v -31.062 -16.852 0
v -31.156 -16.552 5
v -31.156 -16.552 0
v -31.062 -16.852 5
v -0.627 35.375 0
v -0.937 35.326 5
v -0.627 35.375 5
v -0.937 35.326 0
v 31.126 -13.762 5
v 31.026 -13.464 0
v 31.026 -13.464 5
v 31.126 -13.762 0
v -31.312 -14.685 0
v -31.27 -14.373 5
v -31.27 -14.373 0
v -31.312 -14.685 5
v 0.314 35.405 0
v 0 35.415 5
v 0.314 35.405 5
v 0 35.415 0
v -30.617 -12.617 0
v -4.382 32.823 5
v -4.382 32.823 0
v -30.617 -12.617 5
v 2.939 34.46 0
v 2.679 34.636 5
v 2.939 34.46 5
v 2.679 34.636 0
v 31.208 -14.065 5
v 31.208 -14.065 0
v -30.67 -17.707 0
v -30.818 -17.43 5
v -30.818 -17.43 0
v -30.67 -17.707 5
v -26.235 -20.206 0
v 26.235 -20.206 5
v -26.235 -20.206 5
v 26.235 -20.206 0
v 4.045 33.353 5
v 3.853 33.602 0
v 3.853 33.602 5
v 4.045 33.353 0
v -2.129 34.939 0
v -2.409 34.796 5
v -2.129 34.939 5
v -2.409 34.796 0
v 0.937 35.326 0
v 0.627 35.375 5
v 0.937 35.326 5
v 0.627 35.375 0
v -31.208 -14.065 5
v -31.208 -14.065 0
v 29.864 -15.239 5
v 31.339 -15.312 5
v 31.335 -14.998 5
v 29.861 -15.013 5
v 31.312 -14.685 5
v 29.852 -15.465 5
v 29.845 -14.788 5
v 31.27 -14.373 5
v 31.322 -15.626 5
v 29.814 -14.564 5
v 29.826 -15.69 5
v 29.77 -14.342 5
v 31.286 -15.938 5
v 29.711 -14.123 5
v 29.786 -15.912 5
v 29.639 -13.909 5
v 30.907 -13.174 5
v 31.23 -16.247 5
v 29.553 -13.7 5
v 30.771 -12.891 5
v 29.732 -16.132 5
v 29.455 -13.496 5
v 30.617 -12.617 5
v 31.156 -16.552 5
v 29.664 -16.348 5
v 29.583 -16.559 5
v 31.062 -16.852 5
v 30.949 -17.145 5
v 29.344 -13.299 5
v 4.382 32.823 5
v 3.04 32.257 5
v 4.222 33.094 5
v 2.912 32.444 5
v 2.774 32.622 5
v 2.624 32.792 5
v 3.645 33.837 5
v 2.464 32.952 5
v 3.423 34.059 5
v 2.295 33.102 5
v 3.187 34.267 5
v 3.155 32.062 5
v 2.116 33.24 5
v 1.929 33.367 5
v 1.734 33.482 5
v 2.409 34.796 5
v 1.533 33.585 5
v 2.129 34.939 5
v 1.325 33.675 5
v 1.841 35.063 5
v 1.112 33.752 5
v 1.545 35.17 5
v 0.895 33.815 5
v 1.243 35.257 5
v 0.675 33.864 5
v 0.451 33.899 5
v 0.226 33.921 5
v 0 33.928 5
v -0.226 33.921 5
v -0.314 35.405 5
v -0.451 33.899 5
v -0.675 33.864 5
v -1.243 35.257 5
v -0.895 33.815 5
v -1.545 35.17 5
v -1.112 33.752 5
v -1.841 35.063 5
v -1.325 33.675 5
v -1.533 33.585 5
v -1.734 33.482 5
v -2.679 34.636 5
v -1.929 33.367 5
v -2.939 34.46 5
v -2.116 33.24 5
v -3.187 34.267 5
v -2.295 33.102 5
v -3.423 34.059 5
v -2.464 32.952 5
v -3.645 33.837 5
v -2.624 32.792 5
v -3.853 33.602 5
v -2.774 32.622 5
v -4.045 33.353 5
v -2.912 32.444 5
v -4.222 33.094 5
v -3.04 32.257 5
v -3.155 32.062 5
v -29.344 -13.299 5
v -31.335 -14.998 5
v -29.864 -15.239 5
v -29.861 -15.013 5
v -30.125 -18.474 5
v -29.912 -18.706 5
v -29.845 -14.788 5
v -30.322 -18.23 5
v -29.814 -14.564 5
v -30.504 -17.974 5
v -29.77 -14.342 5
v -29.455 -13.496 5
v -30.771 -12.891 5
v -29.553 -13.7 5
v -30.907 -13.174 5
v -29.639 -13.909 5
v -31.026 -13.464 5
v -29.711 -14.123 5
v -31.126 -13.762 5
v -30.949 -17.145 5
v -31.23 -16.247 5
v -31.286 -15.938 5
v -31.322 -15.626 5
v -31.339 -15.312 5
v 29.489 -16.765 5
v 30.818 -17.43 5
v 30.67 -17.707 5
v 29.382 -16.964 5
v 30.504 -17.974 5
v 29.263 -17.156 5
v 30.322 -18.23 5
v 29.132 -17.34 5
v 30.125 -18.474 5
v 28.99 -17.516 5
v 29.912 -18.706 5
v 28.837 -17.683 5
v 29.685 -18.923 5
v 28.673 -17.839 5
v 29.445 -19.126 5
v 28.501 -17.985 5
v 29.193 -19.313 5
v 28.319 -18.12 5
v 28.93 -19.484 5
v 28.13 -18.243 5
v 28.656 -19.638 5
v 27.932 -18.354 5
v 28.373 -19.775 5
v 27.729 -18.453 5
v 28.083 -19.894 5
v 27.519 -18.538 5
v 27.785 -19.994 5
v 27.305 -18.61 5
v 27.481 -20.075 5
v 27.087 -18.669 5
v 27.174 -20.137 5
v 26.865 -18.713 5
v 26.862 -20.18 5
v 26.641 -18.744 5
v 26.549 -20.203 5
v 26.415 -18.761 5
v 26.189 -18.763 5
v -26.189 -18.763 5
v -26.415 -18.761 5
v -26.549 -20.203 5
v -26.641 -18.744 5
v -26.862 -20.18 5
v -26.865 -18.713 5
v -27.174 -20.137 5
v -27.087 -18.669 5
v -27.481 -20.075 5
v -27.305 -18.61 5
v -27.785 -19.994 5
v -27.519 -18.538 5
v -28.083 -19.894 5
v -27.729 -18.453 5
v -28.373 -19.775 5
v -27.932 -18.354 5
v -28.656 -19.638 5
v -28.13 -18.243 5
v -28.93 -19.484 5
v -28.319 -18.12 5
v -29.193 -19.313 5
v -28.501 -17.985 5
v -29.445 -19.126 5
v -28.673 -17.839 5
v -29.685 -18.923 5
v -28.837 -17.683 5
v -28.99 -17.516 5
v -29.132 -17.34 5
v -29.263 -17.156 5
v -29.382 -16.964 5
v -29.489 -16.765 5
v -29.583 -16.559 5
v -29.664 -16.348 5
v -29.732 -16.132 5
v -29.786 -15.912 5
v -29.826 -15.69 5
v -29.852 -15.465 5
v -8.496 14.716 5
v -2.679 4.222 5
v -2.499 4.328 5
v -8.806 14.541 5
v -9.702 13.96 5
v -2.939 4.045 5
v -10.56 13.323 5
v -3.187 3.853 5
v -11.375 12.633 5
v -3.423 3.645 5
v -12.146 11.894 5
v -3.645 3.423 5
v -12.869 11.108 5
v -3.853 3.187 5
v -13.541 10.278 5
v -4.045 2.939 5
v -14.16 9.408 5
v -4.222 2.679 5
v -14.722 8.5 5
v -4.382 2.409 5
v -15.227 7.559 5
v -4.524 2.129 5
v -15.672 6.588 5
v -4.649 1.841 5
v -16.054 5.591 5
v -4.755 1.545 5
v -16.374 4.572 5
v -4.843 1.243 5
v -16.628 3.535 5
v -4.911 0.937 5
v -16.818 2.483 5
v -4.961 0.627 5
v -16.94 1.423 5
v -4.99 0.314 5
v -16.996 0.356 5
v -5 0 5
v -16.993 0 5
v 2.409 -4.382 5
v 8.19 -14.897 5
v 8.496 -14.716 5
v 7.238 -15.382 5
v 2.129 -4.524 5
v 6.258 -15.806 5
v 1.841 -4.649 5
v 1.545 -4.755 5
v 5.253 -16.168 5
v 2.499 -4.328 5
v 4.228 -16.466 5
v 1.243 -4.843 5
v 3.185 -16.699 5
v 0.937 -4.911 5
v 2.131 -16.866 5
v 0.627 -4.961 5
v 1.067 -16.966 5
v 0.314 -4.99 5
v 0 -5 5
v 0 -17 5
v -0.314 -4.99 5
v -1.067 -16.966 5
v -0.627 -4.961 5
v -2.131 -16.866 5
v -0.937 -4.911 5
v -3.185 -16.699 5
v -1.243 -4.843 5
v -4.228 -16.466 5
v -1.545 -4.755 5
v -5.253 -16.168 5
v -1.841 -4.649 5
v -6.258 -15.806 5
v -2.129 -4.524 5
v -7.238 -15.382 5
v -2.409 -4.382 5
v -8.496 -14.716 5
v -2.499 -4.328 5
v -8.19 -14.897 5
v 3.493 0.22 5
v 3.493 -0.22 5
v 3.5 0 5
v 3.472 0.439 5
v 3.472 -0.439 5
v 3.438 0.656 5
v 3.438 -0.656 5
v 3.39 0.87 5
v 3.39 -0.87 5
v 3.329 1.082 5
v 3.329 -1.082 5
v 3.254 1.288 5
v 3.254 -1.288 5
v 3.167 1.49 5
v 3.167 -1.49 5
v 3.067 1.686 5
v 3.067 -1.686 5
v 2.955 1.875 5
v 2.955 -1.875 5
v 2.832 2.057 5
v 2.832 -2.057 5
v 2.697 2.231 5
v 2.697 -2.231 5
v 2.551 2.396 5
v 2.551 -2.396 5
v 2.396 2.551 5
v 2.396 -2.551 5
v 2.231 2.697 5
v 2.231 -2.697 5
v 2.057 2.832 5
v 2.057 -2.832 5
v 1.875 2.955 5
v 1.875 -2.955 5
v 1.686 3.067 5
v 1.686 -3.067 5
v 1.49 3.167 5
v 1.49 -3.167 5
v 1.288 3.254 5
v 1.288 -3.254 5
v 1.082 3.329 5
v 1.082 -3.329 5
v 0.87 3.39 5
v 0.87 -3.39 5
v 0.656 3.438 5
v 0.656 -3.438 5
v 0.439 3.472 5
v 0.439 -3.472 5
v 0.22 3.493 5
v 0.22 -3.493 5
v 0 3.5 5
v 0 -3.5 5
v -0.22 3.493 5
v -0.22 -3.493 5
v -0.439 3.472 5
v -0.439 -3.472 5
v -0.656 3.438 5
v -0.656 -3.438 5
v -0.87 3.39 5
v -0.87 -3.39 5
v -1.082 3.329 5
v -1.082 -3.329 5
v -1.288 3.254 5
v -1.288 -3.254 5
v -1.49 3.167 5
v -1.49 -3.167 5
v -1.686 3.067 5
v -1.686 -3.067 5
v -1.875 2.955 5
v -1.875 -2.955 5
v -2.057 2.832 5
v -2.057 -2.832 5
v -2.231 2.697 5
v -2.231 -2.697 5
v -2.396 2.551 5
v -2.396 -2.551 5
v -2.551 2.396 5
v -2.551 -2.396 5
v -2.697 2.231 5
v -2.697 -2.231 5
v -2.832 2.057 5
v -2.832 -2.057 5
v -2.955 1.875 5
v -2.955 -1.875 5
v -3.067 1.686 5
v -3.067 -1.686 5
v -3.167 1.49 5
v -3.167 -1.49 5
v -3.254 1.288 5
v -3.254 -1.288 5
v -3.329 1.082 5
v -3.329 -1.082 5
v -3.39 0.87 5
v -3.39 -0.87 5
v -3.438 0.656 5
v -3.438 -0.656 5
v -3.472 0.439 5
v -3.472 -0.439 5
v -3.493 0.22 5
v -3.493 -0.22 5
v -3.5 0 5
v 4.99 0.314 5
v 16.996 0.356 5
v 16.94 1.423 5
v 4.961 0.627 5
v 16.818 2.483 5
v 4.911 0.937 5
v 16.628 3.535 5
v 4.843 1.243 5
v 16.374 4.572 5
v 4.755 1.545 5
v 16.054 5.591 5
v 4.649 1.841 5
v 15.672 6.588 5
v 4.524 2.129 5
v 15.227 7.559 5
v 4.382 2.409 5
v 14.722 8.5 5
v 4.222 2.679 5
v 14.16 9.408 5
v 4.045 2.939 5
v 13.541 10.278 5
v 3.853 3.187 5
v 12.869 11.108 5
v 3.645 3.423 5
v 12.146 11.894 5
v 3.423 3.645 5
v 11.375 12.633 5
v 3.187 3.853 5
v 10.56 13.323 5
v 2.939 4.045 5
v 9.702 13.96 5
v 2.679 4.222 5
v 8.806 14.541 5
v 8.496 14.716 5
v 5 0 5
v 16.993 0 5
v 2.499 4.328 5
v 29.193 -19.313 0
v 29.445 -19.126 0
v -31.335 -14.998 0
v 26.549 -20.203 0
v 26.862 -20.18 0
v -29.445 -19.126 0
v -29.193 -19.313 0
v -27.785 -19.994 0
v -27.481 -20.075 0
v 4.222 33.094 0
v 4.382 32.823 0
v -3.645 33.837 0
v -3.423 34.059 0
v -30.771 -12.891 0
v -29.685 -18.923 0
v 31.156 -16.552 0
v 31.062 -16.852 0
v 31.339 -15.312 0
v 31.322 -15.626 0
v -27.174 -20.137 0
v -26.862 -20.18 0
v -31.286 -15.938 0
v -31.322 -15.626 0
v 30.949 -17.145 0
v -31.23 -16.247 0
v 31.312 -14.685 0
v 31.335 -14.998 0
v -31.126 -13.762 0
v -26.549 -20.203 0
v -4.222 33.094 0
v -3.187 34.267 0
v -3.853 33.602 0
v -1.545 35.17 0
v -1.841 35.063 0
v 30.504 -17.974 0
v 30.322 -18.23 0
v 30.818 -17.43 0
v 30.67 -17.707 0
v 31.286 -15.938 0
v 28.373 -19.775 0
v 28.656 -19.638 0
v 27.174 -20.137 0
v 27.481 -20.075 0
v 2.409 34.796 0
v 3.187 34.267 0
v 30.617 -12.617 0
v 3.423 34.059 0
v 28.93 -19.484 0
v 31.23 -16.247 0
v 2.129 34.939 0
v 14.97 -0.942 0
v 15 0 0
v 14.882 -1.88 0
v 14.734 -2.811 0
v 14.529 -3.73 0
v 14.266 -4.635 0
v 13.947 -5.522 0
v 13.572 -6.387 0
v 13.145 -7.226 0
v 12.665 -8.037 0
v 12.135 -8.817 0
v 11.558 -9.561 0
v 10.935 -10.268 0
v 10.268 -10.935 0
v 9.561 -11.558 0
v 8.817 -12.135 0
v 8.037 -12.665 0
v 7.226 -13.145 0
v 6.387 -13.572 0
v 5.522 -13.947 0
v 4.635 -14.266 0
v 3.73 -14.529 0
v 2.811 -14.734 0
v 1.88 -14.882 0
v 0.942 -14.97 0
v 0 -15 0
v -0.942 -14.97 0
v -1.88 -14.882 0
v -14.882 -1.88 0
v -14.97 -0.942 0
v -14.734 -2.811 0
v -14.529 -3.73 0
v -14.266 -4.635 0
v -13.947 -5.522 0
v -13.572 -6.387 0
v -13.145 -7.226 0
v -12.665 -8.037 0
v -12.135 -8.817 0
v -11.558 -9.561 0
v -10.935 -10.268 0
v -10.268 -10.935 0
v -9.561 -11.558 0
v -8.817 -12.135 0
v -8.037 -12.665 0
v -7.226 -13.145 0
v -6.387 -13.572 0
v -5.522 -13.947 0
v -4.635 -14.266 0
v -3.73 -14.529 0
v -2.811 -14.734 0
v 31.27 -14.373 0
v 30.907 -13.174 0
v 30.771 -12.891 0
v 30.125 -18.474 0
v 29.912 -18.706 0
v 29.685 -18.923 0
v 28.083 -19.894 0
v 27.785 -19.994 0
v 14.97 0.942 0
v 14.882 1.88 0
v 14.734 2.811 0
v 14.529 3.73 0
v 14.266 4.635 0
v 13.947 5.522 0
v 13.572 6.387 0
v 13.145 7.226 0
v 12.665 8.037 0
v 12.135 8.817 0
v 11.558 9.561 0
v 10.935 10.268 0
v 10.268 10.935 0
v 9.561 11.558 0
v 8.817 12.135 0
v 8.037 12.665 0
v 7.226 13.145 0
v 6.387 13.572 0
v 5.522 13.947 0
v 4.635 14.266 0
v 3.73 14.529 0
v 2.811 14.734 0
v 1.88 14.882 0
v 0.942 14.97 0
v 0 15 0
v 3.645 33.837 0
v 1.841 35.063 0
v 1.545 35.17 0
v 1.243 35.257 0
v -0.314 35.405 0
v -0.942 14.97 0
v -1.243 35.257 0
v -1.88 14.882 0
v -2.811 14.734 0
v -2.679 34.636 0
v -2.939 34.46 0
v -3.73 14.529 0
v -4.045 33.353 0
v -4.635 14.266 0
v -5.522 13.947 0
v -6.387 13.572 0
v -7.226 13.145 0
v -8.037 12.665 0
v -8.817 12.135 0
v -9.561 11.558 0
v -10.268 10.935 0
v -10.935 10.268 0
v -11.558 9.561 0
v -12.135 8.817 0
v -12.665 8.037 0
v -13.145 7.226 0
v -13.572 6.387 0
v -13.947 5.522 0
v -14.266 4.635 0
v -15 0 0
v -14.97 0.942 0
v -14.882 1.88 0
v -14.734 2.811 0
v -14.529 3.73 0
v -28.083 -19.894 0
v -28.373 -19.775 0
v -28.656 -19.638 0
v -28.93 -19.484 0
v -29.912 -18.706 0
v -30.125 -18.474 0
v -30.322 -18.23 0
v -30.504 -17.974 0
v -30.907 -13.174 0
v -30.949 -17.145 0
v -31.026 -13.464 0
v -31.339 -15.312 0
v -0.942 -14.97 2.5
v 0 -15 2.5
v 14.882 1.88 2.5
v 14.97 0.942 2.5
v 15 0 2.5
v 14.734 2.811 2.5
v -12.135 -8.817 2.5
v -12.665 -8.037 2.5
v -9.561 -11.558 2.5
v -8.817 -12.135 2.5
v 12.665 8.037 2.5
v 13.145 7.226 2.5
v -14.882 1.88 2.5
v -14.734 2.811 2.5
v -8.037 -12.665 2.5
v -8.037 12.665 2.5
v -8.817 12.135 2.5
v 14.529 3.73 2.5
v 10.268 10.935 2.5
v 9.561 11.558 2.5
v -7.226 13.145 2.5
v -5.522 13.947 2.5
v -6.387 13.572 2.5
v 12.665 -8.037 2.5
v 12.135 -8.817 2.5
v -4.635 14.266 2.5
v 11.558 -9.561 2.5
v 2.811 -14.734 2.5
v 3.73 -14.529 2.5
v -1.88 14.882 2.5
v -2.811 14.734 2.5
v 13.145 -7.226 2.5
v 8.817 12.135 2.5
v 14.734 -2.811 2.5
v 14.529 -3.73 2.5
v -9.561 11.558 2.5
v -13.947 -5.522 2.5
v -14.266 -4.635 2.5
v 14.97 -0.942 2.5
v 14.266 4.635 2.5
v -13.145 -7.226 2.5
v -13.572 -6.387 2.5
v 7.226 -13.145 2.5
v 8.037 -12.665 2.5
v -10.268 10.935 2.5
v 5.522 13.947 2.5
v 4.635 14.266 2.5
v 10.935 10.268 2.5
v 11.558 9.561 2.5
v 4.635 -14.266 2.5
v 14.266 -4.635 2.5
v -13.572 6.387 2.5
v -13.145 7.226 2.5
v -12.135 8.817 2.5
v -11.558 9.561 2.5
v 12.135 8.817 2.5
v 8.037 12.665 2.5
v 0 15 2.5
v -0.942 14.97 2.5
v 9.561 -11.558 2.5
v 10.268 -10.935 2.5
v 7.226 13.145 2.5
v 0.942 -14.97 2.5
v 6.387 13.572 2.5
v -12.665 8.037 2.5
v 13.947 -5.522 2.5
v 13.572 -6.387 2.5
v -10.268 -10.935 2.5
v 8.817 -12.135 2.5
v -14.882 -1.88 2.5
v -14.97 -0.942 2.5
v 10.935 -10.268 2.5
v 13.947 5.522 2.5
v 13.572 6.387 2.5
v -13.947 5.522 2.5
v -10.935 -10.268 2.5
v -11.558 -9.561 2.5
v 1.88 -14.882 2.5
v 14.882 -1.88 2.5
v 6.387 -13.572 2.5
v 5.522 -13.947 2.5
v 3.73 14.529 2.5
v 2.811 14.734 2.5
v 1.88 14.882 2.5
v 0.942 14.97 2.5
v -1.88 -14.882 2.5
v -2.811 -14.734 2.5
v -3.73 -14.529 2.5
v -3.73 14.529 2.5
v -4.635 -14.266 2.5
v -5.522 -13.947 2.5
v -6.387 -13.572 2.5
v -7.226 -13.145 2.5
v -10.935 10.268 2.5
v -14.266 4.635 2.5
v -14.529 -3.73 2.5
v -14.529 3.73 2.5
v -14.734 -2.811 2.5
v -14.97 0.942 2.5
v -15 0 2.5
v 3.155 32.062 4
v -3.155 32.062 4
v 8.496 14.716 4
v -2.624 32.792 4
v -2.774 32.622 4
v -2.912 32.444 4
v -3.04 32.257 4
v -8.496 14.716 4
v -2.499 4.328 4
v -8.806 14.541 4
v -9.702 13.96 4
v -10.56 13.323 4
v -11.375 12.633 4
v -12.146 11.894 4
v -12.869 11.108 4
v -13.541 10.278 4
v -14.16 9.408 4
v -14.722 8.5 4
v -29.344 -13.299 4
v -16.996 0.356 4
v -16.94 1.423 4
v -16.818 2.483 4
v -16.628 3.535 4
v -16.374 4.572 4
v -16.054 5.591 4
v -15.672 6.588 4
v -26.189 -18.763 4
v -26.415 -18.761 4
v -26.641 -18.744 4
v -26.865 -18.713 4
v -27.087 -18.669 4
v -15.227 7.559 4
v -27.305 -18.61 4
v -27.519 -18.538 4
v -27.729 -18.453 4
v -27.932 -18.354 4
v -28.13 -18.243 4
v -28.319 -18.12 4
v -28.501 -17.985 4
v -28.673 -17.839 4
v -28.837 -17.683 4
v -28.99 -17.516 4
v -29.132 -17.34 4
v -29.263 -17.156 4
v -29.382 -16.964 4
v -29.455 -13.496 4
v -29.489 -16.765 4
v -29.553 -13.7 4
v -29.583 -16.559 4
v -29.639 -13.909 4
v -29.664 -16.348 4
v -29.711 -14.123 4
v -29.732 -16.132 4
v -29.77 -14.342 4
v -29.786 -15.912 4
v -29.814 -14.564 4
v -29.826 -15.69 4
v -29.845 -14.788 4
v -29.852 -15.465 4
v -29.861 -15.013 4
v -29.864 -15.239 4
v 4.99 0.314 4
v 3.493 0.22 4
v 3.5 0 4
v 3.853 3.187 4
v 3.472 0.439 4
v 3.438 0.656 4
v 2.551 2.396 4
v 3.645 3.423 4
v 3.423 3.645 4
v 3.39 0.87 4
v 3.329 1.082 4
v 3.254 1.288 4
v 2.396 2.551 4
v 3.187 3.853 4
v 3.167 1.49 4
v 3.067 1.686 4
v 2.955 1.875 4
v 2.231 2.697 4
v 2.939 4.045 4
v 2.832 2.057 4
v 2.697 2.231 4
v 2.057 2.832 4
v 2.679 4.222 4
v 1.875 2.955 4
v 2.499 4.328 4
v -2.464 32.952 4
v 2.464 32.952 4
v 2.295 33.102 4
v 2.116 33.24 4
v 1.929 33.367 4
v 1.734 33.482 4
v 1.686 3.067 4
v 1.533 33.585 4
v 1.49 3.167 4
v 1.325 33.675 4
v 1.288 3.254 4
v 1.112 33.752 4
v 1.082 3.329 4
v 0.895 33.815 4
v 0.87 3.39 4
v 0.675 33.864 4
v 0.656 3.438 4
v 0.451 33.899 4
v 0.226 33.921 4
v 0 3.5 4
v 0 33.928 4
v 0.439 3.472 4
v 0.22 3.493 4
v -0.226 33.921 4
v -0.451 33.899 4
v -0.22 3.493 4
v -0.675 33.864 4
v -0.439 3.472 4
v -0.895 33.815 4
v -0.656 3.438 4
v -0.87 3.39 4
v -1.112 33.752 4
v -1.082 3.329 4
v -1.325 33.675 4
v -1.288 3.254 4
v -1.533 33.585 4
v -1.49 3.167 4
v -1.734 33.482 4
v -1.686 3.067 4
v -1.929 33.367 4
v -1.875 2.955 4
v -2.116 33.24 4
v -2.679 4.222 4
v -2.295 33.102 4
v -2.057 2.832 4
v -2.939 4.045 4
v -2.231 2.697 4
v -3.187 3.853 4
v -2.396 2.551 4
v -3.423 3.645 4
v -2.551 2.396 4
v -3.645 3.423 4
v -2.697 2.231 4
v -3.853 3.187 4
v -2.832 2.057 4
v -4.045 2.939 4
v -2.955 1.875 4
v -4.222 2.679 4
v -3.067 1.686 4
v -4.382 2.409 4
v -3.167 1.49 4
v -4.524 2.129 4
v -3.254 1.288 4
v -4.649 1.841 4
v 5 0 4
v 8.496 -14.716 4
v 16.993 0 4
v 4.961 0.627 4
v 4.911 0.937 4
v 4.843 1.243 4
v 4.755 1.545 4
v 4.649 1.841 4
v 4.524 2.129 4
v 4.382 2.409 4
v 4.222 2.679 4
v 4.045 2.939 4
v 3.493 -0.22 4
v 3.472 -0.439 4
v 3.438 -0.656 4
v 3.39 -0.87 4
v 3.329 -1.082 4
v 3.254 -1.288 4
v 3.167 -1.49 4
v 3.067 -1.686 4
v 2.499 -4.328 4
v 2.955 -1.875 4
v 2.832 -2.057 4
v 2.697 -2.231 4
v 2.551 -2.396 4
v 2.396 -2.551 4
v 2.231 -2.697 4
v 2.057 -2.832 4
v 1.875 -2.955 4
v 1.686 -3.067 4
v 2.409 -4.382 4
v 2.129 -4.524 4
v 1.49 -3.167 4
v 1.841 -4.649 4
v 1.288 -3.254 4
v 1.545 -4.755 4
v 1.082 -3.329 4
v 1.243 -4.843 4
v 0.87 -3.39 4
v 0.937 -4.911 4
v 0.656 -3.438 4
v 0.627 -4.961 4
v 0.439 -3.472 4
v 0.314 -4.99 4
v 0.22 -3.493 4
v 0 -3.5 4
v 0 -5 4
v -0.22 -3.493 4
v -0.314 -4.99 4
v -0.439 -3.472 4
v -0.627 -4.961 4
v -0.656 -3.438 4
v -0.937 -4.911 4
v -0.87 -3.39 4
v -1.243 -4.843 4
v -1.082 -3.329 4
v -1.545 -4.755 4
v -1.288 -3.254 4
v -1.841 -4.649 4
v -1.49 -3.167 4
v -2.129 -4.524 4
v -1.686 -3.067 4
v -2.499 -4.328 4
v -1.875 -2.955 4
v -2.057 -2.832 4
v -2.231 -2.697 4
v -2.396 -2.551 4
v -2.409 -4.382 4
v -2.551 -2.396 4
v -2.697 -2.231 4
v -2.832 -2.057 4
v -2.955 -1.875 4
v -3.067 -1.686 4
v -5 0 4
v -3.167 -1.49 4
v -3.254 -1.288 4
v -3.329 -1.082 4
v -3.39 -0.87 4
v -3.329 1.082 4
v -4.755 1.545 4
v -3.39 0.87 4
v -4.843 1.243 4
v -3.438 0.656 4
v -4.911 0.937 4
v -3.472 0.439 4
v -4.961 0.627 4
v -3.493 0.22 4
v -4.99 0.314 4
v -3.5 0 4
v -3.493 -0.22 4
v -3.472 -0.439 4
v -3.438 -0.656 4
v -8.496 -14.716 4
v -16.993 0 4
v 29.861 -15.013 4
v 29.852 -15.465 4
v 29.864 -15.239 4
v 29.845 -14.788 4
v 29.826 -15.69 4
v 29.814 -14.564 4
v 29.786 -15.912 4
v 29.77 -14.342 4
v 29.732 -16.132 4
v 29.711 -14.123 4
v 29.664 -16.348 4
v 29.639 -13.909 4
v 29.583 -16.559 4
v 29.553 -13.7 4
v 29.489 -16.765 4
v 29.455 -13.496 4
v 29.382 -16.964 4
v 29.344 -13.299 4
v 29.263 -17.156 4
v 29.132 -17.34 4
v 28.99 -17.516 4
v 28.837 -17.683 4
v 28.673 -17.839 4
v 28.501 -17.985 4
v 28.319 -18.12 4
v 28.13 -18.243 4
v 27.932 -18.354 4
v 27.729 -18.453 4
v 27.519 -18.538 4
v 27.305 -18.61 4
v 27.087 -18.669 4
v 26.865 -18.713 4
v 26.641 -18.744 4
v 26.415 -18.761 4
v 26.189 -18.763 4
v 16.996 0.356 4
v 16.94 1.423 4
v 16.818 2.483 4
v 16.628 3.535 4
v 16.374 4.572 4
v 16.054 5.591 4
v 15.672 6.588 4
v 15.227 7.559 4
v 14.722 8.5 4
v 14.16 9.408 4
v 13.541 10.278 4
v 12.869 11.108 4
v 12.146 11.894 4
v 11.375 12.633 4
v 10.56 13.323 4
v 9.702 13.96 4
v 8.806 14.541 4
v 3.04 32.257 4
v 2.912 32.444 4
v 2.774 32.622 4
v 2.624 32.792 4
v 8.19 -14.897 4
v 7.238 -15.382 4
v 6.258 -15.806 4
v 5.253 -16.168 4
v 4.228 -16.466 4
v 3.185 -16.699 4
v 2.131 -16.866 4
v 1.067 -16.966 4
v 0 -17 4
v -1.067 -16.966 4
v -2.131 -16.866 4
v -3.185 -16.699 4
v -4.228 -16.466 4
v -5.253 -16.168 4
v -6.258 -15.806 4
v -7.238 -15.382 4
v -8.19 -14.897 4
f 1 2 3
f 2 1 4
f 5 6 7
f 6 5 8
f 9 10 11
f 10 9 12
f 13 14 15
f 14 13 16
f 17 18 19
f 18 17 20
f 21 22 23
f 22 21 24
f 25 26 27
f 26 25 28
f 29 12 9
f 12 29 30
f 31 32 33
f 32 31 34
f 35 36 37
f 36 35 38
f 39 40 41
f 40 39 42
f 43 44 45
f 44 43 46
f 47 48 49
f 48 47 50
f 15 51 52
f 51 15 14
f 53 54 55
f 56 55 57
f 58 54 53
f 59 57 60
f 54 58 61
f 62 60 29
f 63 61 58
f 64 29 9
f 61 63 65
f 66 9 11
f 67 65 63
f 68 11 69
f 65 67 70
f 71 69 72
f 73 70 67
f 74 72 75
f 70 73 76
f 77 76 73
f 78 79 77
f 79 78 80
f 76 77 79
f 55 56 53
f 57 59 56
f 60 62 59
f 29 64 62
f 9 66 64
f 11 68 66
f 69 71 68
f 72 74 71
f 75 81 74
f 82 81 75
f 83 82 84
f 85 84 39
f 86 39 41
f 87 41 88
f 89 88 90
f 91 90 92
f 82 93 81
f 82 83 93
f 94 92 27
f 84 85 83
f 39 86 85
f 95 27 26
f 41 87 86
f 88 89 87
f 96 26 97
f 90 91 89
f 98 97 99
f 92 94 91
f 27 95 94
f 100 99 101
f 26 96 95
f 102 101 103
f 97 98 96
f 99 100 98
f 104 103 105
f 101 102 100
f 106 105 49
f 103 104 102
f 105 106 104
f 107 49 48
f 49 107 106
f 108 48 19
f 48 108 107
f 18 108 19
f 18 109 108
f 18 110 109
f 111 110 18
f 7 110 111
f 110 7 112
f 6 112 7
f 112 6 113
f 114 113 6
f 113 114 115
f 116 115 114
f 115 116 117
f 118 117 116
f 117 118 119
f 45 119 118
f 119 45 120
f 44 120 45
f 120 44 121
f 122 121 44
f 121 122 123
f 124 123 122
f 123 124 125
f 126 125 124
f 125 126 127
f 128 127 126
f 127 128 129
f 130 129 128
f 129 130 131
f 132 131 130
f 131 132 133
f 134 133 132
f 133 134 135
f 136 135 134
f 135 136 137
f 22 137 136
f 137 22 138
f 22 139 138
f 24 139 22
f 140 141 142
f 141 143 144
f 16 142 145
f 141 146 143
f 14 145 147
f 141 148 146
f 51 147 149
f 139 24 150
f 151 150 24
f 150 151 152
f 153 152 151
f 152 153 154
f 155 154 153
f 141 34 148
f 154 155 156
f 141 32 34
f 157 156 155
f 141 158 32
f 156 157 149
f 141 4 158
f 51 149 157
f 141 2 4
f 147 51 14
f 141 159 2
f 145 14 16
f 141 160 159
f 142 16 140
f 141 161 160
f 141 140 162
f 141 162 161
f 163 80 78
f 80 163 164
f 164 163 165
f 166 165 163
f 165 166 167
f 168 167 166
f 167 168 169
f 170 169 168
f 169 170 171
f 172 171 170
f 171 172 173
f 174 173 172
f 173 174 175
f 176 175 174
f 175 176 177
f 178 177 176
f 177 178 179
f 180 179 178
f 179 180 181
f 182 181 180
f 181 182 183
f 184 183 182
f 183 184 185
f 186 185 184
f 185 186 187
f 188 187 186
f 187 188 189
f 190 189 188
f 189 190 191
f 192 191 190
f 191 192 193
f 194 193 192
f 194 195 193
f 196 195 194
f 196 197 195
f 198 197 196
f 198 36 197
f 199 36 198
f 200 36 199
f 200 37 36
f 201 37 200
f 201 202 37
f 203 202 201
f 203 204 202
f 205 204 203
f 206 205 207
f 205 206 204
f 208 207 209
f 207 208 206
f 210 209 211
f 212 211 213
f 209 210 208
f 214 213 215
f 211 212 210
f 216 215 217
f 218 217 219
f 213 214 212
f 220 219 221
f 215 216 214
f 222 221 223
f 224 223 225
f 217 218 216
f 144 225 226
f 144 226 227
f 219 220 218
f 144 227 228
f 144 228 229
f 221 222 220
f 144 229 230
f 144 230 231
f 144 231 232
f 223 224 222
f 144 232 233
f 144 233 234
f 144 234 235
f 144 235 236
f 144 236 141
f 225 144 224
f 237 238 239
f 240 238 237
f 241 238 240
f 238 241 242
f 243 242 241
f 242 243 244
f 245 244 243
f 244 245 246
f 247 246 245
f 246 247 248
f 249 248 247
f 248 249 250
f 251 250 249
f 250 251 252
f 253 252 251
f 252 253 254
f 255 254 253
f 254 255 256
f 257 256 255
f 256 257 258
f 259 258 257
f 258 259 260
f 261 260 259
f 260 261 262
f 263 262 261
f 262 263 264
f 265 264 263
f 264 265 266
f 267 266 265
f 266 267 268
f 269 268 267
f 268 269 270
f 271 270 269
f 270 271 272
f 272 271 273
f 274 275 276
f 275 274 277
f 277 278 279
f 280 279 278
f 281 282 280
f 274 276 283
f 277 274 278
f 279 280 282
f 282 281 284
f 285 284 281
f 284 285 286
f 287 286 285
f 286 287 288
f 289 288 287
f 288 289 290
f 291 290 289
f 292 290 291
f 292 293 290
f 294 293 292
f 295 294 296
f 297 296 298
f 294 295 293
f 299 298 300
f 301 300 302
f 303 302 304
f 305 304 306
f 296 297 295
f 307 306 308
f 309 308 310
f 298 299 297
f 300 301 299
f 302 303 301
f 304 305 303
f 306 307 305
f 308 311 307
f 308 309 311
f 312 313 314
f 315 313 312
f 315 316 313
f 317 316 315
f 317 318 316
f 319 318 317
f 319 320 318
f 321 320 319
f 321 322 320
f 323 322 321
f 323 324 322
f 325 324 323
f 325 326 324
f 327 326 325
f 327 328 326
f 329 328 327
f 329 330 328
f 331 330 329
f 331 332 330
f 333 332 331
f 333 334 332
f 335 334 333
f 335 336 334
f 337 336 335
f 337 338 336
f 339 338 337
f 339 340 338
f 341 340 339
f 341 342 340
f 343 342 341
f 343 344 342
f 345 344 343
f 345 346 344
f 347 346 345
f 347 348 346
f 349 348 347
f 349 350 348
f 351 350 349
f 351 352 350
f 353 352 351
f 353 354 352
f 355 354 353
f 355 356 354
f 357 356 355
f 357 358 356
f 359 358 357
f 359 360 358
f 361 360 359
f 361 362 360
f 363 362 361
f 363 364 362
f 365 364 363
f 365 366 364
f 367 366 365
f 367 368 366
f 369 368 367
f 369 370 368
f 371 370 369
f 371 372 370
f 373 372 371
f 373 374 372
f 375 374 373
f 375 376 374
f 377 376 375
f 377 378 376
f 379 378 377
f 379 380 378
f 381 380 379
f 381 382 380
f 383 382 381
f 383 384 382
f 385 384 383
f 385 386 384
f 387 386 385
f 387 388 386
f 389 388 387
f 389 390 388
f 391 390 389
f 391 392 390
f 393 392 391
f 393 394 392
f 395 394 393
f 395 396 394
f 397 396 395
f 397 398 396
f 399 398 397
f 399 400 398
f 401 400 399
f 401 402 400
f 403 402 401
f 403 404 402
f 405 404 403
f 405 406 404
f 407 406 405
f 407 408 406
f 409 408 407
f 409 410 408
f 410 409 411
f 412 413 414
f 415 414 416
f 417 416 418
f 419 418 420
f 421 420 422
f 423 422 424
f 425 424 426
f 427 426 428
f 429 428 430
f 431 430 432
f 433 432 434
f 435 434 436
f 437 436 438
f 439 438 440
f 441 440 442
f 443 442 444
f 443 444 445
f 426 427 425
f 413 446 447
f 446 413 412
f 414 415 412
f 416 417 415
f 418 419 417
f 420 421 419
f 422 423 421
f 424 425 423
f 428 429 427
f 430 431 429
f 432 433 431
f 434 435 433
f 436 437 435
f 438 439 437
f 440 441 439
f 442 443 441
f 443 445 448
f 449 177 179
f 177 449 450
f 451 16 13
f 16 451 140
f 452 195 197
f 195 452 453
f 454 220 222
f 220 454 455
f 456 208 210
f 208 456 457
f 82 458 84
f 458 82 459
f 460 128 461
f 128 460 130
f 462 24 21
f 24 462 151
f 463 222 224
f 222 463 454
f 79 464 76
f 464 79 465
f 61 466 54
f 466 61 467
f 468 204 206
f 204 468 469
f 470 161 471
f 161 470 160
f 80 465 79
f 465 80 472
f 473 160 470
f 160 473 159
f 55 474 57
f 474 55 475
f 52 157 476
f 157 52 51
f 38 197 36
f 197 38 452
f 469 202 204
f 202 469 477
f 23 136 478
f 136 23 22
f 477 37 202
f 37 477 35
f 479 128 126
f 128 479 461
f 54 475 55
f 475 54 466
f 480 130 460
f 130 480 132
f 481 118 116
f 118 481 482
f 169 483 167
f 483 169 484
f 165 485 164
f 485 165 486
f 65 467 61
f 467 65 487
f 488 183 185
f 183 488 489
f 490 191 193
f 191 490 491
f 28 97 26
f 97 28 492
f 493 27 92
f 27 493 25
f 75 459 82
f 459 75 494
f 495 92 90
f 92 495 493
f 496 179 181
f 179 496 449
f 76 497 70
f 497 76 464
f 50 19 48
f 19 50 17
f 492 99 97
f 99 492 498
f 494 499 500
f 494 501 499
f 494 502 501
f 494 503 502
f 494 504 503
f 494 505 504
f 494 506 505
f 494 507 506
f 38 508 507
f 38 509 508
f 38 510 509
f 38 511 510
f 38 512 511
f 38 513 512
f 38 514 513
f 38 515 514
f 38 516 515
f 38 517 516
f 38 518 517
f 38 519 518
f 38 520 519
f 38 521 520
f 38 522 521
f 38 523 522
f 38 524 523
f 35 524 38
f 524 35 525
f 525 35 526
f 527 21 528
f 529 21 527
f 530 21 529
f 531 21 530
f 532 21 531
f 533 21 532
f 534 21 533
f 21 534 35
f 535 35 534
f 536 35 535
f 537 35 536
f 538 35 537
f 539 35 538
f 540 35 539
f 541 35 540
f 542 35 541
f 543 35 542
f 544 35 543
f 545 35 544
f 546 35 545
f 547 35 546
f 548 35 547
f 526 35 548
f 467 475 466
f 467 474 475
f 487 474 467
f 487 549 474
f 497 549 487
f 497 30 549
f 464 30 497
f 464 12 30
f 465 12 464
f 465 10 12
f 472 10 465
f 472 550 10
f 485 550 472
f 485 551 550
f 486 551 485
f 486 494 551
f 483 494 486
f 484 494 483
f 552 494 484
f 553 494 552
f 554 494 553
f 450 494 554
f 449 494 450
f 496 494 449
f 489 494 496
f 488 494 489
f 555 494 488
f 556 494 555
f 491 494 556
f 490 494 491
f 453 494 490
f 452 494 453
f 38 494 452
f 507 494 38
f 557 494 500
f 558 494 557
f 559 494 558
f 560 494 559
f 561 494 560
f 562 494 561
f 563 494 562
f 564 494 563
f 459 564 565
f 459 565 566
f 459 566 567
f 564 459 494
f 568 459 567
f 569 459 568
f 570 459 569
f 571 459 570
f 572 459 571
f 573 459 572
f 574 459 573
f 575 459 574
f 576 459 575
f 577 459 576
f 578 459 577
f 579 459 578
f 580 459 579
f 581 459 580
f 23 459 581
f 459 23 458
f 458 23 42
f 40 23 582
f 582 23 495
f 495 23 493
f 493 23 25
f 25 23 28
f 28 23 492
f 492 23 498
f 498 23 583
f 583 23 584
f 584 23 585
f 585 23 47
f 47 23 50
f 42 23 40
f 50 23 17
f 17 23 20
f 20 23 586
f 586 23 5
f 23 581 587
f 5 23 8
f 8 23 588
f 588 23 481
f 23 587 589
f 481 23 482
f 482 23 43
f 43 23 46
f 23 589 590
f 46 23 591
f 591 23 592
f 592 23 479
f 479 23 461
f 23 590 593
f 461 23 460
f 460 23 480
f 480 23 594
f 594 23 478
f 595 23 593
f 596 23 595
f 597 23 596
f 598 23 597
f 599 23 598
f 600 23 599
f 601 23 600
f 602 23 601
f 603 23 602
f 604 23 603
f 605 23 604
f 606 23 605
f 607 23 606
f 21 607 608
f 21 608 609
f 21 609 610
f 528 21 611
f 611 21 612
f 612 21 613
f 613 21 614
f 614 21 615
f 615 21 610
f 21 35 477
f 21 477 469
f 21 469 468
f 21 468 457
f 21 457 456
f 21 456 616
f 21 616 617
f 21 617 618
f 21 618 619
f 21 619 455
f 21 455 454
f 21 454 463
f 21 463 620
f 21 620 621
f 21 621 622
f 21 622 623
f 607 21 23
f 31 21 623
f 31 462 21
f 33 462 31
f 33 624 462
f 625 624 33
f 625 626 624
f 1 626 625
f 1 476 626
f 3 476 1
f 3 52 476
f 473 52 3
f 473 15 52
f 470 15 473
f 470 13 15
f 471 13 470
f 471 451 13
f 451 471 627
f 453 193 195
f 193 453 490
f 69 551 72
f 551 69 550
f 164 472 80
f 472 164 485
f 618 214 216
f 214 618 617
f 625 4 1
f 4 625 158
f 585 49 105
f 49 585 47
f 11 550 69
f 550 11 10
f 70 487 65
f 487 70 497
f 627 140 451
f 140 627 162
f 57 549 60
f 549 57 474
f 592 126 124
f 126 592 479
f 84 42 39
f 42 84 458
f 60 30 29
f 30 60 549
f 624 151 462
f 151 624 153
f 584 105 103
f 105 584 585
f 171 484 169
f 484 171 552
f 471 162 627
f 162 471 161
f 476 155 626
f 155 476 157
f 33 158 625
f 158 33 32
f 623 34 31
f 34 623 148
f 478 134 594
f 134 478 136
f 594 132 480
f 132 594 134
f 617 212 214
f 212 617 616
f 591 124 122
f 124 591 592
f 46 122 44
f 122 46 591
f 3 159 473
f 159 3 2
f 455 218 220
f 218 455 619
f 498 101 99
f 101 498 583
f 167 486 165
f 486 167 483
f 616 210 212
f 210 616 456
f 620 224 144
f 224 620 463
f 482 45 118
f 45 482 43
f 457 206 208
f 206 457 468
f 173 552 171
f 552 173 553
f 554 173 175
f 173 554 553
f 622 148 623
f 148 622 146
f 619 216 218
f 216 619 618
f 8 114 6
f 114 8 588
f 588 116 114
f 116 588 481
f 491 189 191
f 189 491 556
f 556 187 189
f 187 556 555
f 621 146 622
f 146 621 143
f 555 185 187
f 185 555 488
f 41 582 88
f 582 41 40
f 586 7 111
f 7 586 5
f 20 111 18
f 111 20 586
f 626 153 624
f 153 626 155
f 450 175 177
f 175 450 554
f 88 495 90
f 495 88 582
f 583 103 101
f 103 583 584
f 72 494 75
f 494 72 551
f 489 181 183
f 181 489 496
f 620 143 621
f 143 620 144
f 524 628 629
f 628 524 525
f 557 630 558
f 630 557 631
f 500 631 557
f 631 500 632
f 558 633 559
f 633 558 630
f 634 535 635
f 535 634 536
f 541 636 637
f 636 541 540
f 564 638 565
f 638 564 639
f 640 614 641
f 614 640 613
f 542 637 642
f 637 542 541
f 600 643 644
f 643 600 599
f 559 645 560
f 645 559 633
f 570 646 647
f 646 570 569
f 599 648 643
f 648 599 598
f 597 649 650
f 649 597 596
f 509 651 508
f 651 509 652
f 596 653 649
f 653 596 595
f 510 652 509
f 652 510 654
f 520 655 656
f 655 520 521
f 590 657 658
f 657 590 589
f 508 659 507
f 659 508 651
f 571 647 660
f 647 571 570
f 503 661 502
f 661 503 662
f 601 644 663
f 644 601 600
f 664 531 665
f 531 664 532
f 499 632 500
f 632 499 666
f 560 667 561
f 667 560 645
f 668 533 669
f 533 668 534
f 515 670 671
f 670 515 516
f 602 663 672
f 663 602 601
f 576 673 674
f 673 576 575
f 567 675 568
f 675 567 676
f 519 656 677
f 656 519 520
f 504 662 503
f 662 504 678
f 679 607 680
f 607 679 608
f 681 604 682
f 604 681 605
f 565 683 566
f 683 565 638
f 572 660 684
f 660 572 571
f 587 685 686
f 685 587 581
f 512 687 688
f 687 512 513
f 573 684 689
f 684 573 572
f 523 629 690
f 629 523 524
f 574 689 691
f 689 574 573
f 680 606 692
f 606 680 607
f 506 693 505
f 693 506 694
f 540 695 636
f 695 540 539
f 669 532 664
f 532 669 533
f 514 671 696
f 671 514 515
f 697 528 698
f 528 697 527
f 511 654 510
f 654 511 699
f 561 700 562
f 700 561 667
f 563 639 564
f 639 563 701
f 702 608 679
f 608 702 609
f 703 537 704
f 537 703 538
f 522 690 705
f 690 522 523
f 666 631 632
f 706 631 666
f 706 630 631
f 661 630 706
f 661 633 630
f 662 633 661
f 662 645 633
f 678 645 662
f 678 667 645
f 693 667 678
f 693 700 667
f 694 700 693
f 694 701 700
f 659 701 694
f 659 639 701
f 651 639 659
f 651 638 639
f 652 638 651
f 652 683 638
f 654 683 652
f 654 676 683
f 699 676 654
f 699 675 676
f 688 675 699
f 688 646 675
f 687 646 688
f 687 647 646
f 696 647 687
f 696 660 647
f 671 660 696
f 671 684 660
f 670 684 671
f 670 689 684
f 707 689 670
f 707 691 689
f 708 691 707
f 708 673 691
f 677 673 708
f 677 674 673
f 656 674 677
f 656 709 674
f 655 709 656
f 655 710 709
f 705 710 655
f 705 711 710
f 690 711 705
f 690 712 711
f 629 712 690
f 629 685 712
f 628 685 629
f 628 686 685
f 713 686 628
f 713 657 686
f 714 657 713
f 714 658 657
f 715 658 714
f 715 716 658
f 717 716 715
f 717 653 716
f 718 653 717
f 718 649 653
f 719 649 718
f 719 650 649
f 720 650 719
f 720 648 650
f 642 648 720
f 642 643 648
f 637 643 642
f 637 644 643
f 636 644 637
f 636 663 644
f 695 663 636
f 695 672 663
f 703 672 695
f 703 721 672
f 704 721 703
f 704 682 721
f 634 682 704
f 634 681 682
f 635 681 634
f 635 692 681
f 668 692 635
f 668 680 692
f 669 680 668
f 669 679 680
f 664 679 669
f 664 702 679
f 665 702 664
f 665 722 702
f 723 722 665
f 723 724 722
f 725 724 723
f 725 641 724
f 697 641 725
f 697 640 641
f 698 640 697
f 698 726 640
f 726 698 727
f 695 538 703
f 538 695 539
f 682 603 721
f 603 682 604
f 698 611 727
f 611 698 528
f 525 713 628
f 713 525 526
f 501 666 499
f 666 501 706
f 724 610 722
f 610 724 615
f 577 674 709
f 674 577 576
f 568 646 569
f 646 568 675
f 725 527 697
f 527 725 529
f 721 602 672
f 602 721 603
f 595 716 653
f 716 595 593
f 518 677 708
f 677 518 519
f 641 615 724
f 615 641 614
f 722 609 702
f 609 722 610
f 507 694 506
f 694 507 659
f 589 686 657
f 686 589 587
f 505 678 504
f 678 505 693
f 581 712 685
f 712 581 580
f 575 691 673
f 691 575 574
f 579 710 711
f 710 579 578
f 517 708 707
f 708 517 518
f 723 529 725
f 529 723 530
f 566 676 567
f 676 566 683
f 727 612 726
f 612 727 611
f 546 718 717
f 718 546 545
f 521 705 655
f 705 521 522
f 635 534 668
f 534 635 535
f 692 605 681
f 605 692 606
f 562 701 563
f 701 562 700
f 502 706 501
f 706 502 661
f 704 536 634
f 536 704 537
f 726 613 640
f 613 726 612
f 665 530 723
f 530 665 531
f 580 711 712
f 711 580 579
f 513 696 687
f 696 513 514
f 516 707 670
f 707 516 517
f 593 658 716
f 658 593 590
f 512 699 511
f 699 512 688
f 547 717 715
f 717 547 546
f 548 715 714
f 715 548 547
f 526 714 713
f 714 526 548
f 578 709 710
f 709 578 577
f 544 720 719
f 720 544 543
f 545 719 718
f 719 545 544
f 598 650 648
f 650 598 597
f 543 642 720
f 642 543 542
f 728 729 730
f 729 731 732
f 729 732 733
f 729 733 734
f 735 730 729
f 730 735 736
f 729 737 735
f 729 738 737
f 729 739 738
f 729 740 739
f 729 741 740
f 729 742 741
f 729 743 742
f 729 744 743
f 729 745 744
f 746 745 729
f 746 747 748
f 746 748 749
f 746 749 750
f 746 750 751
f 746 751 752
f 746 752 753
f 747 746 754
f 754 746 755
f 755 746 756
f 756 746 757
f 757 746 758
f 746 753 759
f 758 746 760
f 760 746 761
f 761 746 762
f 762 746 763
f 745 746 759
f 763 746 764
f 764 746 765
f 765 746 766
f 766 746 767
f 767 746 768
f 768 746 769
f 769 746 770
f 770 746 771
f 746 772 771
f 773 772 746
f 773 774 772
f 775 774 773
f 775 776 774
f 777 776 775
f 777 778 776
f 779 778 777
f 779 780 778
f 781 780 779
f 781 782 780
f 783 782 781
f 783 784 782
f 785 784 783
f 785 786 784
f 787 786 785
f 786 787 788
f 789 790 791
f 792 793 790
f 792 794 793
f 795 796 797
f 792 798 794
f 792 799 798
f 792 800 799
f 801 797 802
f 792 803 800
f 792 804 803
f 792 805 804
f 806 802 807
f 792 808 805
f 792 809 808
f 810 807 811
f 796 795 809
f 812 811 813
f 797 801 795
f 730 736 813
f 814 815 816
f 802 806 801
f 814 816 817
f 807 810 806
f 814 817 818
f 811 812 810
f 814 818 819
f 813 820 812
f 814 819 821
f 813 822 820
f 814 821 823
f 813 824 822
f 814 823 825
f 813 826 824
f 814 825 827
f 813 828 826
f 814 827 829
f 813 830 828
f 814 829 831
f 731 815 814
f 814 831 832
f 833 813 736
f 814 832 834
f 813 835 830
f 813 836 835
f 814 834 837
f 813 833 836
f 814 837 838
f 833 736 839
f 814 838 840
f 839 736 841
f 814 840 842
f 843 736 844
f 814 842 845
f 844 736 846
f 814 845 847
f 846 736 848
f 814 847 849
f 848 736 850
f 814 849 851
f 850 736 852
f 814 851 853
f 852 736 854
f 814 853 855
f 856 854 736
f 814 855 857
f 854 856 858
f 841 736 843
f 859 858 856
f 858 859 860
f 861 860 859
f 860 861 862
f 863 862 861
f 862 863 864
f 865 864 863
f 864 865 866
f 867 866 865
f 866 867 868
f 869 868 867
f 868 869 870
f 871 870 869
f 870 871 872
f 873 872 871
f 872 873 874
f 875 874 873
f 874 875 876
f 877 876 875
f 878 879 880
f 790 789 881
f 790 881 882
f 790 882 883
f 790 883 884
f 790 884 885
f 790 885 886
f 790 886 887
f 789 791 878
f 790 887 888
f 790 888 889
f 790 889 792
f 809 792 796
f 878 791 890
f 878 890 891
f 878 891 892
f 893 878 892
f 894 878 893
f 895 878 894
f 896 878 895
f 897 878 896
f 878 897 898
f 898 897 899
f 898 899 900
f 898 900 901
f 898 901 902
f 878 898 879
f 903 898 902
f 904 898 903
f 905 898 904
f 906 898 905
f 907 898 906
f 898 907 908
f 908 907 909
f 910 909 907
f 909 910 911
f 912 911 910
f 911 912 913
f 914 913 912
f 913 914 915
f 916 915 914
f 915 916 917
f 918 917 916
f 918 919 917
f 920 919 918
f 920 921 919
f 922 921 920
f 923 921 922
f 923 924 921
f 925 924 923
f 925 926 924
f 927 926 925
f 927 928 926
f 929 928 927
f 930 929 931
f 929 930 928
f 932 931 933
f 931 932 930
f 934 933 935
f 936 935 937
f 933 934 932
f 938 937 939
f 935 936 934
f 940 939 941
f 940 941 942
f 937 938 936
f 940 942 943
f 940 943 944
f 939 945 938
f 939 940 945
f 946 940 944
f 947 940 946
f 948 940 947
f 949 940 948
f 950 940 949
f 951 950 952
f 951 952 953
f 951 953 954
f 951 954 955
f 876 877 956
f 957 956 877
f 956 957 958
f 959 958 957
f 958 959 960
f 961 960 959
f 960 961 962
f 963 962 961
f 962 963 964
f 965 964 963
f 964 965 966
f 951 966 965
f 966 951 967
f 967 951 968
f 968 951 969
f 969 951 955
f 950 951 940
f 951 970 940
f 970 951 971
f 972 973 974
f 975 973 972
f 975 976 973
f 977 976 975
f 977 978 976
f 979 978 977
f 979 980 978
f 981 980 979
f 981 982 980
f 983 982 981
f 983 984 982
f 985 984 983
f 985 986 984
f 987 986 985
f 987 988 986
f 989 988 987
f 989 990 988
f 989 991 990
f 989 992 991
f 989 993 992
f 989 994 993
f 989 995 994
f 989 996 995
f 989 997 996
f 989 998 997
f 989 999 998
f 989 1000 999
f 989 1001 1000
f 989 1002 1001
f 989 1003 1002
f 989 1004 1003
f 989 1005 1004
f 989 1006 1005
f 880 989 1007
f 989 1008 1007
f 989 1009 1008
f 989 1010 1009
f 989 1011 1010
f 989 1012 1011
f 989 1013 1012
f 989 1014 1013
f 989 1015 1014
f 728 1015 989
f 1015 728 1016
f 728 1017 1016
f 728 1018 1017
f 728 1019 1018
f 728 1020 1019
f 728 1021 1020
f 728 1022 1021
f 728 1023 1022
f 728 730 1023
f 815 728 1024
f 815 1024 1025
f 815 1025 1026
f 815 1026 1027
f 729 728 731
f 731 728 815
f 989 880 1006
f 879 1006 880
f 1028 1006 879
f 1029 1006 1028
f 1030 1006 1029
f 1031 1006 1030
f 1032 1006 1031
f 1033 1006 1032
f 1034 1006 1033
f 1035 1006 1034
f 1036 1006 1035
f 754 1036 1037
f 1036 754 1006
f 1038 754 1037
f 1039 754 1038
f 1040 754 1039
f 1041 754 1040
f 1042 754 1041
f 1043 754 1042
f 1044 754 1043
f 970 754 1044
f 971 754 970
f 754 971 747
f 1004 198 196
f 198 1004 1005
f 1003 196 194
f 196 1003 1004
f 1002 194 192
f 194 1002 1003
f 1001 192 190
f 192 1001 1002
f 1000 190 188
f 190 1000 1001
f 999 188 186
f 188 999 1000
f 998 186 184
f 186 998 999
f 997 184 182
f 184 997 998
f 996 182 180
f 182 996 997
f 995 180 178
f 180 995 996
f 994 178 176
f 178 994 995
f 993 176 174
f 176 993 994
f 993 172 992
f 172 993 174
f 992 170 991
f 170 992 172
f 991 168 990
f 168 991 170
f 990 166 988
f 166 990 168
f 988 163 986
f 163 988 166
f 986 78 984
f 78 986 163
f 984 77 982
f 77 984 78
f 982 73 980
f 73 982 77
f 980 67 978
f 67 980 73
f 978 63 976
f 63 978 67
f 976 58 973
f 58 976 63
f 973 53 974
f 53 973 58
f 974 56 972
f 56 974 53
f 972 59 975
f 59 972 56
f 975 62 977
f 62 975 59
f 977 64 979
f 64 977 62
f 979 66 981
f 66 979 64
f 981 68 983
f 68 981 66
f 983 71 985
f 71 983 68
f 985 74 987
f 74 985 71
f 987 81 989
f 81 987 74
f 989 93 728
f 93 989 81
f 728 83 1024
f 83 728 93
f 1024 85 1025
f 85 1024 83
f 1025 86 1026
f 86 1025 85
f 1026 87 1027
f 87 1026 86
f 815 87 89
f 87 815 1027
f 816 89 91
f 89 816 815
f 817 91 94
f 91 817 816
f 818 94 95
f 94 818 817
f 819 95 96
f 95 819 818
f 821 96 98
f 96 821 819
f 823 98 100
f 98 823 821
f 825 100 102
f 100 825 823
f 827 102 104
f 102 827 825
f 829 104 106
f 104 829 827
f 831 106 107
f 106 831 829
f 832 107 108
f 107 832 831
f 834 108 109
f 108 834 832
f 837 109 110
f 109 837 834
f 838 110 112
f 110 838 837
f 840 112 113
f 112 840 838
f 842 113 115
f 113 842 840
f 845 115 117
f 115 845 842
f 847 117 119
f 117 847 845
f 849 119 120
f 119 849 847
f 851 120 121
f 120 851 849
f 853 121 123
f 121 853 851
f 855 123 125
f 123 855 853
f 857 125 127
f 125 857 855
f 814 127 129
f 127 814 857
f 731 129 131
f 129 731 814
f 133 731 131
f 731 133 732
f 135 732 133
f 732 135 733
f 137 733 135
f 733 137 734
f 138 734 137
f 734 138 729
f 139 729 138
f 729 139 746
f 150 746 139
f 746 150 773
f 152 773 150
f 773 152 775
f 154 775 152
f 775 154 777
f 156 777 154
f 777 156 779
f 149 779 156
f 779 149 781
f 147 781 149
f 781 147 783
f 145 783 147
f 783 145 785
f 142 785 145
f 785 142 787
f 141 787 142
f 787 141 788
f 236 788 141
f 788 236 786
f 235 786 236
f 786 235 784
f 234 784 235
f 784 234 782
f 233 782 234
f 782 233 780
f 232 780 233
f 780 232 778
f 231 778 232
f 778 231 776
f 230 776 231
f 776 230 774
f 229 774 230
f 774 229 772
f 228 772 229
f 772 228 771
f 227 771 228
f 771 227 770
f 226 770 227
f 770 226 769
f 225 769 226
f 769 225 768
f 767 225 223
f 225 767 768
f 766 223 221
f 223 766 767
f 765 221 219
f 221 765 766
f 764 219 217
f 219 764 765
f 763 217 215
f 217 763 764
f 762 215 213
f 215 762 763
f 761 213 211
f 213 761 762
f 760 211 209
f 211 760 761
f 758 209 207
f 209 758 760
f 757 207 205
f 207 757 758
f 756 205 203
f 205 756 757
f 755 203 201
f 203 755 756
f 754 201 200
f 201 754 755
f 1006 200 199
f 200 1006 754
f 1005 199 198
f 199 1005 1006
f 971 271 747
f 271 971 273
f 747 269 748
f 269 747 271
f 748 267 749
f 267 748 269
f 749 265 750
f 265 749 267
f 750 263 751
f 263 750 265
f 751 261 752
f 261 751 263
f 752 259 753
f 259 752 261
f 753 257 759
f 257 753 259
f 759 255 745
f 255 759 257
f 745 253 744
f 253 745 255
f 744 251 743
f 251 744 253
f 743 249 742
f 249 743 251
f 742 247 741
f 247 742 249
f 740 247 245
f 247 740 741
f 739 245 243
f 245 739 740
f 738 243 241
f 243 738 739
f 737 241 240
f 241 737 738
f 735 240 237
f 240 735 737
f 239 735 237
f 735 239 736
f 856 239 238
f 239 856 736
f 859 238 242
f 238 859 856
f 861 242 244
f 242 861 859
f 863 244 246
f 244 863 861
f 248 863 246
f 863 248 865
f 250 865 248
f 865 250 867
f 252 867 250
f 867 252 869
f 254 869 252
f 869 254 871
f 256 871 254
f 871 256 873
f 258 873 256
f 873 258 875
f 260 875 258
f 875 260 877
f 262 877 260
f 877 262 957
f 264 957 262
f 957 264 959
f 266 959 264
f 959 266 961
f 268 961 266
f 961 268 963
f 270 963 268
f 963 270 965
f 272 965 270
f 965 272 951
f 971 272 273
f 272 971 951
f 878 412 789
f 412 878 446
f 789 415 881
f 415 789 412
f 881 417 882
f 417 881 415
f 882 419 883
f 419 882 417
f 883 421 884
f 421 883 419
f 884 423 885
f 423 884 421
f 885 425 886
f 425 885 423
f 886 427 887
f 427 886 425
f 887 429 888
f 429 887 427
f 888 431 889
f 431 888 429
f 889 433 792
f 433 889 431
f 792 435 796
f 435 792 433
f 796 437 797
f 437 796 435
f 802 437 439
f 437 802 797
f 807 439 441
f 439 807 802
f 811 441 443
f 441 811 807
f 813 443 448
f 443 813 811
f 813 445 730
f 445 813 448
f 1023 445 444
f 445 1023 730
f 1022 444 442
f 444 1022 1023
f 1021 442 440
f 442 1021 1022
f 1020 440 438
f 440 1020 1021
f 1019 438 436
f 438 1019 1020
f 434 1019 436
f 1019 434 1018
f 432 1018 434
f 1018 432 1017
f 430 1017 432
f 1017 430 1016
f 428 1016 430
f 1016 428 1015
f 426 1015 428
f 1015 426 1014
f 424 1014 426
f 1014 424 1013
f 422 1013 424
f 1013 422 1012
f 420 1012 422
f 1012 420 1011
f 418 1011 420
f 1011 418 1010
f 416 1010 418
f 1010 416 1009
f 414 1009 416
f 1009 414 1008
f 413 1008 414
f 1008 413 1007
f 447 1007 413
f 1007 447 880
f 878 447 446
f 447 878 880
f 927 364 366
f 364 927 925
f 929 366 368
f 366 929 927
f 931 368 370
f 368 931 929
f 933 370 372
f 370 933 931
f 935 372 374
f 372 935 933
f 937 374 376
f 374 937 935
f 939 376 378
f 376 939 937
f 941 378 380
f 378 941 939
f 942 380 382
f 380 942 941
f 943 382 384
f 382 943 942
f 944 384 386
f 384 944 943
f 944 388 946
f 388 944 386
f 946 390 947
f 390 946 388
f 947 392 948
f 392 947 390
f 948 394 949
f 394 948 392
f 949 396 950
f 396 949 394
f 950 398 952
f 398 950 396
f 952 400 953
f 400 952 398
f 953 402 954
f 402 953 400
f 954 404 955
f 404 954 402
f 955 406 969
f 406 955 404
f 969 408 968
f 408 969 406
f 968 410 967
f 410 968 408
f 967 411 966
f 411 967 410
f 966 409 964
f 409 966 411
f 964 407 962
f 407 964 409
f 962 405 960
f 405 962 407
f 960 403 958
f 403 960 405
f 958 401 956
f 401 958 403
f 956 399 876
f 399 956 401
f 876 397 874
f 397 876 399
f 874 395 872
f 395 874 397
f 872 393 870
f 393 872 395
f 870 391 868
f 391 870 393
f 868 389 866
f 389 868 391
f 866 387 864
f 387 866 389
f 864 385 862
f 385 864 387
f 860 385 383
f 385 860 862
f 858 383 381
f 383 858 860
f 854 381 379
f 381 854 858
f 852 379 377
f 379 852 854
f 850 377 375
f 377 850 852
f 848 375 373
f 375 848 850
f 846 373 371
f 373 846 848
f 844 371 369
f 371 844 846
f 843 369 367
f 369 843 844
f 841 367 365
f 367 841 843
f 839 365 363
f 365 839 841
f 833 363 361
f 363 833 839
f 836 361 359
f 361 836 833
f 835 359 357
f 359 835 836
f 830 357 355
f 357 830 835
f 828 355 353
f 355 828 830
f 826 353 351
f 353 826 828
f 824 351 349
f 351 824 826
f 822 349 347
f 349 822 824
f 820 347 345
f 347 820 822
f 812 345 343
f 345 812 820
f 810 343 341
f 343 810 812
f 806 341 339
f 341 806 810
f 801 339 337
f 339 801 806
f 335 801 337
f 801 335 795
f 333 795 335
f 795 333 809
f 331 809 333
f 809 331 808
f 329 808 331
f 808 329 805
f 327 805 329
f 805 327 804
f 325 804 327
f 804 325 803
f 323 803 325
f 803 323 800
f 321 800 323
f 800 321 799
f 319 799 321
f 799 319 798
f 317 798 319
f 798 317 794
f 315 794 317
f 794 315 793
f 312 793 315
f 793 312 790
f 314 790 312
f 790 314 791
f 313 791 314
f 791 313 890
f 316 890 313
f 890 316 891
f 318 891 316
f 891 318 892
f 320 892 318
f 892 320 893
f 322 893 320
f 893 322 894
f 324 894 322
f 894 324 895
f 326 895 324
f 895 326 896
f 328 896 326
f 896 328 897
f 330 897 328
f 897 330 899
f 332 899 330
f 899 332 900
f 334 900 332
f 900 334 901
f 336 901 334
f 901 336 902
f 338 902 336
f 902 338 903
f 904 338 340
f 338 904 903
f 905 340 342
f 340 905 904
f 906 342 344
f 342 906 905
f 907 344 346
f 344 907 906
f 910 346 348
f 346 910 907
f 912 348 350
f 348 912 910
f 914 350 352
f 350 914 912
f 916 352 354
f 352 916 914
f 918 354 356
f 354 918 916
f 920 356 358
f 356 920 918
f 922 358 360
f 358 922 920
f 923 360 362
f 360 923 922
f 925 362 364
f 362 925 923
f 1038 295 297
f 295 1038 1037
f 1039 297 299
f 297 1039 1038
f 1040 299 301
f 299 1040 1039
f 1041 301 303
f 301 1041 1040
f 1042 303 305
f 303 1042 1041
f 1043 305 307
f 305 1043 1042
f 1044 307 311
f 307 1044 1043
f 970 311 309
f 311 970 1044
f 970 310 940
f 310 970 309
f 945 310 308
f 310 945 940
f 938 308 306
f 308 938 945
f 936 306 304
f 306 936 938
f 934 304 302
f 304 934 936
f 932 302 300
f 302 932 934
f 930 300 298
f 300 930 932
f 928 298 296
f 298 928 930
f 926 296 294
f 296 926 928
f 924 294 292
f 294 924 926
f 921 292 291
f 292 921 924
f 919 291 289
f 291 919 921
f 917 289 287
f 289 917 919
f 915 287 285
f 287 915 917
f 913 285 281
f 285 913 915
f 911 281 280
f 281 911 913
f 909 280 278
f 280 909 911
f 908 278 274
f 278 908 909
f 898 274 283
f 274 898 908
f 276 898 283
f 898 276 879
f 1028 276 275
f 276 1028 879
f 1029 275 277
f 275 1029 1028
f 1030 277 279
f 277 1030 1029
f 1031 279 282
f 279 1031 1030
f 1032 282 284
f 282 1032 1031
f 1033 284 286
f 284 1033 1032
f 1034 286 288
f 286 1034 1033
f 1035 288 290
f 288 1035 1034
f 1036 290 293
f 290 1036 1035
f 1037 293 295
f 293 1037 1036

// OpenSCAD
// file: lib.scad
/*
 * Рисует двумерный треугольник со скруглёнными углами
 *
 * a - длина стороны треугольника
 * radius - радиус скругления, должен быть больше нуля
 */
module rounded_regular_triangle(a, radius) {
    assert(radius > 0);

    hull() {
        for (phi = [0 : 120 : 240]) {
            rotate([0, 0, phi]) translate([0, a / sqrt(3) - 2 * radius, 0]) circle(radius);
        }
    }
}

module sector60(r) {
    difference() {
        circle(r);
        
        rotate([0, 0, -30]) translate([0, 2 * r, 0])
            square(4 * r, true);
        
        rotate([0, 0, 30]) translate([0, -2 * r, 0]) 
            square(4 * r, true);
    }
}
// main file
use <lib.scad>;

$fn = 100;

module template() {
    difference() {
        rounded_regular_triangle(65, 3.6);
    
        circle(d=7);
    
        difference() {
            for (phi = [-30 : 120 : 210]) {        
                rotate([0, 0, phi]) sector60(17);
            }
            circle(d=10);
        }
    }
}

difference() {
    linear_extrude(height=5)
        rounded_regular_triangle(70, 5);
    
    cylinder(d=30, h=2.5);
    
    translate([0,0,4])
        linear_extrude(height=2)
            template();
}
